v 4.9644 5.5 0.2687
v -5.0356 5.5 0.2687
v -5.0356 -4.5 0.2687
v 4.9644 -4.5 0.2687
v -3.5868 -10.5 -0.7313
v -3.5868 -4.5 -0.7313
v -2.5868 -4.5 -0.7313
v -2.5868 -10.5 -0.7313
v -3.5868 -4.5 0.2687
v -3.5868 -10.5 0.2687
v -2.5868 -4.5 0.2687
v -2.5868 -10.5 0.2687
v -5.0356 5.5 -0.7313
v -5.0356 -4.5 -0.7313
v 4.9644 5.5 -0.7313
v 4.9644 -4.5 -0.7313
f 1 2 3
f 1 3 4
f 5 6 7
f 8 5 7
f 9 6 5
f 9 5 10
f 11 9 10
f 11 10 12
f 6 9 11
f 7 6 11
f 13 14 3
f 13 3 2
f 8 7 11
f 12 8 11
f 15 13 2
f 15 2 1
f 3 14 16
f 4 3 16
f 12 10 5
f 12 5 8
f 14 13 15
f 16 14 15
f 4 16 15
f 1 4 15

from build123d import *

# Parameters (mm, degrees)
SKETCH1_W             = 10
SKETCH1_H             = 10
BOSS_EXTRUDE1_DEPTH   = 1
SKETCH2_W             = 1
SKETCH2_H             = 1
BOSS_EXTRUDE2_DEPTH   = 6
BODY_MOVE_COPY1_ANGLE = 90
BODY_MOVE_COPY2_ANGLE = 90


with BuildPart() as part:
    # Sketch1 → Boss-Extrude1 (new body)
    with BuildSketch(Plane(origin=(0, 0, 0), x_dir=(1, 0, 0), z_dir=(0, 1, 0))):
        with Locations((-0.035587189, 0.231316726)):
            Rectangle(SKETCH1_W, SKETCH1_H)
    extrude(amount=BOSS_EXTRUDE1_DEPTH)


with BuildPart() as body_2:
    # Sketch2 → Boss-Extrude2 (new body)
    with BuildSketch(Plane.XY.offset(4.768683274)):
        with Locations((-3.086831355, 0.5)):
            Rectangle(SKETCH2_W, SKETCH2_H)
    extrude(amount=BOSS_EXTRUDE2_DEPTH)


with BuildPart() as part_1:
    # Body-Move/Copy1: moved
    add(part.part.rotate(Axis((0, 0.5, -0.231316726), (1, 0, 0)), BODY_MOVE_COPY1_ANGLE))


with BuildPart() as body_2_1:
    # Body-Move/Copy2: moved
    add(body_2.part.rotate(Axis((0, 0.5, 7.768683274), (1, 0, 0)), BODY_MOVE_COPY2_ANGLE))


with BuildPart() as body_2_2:
    # Body-Move/Copy3: read off the stored shape, not the designer's step
    # Body-Move/Copy3: moved
    add(body_2_1.part.moved(Location((0, -8, -8))))


solid = Compound([part_1.part, body_2_2.part])
